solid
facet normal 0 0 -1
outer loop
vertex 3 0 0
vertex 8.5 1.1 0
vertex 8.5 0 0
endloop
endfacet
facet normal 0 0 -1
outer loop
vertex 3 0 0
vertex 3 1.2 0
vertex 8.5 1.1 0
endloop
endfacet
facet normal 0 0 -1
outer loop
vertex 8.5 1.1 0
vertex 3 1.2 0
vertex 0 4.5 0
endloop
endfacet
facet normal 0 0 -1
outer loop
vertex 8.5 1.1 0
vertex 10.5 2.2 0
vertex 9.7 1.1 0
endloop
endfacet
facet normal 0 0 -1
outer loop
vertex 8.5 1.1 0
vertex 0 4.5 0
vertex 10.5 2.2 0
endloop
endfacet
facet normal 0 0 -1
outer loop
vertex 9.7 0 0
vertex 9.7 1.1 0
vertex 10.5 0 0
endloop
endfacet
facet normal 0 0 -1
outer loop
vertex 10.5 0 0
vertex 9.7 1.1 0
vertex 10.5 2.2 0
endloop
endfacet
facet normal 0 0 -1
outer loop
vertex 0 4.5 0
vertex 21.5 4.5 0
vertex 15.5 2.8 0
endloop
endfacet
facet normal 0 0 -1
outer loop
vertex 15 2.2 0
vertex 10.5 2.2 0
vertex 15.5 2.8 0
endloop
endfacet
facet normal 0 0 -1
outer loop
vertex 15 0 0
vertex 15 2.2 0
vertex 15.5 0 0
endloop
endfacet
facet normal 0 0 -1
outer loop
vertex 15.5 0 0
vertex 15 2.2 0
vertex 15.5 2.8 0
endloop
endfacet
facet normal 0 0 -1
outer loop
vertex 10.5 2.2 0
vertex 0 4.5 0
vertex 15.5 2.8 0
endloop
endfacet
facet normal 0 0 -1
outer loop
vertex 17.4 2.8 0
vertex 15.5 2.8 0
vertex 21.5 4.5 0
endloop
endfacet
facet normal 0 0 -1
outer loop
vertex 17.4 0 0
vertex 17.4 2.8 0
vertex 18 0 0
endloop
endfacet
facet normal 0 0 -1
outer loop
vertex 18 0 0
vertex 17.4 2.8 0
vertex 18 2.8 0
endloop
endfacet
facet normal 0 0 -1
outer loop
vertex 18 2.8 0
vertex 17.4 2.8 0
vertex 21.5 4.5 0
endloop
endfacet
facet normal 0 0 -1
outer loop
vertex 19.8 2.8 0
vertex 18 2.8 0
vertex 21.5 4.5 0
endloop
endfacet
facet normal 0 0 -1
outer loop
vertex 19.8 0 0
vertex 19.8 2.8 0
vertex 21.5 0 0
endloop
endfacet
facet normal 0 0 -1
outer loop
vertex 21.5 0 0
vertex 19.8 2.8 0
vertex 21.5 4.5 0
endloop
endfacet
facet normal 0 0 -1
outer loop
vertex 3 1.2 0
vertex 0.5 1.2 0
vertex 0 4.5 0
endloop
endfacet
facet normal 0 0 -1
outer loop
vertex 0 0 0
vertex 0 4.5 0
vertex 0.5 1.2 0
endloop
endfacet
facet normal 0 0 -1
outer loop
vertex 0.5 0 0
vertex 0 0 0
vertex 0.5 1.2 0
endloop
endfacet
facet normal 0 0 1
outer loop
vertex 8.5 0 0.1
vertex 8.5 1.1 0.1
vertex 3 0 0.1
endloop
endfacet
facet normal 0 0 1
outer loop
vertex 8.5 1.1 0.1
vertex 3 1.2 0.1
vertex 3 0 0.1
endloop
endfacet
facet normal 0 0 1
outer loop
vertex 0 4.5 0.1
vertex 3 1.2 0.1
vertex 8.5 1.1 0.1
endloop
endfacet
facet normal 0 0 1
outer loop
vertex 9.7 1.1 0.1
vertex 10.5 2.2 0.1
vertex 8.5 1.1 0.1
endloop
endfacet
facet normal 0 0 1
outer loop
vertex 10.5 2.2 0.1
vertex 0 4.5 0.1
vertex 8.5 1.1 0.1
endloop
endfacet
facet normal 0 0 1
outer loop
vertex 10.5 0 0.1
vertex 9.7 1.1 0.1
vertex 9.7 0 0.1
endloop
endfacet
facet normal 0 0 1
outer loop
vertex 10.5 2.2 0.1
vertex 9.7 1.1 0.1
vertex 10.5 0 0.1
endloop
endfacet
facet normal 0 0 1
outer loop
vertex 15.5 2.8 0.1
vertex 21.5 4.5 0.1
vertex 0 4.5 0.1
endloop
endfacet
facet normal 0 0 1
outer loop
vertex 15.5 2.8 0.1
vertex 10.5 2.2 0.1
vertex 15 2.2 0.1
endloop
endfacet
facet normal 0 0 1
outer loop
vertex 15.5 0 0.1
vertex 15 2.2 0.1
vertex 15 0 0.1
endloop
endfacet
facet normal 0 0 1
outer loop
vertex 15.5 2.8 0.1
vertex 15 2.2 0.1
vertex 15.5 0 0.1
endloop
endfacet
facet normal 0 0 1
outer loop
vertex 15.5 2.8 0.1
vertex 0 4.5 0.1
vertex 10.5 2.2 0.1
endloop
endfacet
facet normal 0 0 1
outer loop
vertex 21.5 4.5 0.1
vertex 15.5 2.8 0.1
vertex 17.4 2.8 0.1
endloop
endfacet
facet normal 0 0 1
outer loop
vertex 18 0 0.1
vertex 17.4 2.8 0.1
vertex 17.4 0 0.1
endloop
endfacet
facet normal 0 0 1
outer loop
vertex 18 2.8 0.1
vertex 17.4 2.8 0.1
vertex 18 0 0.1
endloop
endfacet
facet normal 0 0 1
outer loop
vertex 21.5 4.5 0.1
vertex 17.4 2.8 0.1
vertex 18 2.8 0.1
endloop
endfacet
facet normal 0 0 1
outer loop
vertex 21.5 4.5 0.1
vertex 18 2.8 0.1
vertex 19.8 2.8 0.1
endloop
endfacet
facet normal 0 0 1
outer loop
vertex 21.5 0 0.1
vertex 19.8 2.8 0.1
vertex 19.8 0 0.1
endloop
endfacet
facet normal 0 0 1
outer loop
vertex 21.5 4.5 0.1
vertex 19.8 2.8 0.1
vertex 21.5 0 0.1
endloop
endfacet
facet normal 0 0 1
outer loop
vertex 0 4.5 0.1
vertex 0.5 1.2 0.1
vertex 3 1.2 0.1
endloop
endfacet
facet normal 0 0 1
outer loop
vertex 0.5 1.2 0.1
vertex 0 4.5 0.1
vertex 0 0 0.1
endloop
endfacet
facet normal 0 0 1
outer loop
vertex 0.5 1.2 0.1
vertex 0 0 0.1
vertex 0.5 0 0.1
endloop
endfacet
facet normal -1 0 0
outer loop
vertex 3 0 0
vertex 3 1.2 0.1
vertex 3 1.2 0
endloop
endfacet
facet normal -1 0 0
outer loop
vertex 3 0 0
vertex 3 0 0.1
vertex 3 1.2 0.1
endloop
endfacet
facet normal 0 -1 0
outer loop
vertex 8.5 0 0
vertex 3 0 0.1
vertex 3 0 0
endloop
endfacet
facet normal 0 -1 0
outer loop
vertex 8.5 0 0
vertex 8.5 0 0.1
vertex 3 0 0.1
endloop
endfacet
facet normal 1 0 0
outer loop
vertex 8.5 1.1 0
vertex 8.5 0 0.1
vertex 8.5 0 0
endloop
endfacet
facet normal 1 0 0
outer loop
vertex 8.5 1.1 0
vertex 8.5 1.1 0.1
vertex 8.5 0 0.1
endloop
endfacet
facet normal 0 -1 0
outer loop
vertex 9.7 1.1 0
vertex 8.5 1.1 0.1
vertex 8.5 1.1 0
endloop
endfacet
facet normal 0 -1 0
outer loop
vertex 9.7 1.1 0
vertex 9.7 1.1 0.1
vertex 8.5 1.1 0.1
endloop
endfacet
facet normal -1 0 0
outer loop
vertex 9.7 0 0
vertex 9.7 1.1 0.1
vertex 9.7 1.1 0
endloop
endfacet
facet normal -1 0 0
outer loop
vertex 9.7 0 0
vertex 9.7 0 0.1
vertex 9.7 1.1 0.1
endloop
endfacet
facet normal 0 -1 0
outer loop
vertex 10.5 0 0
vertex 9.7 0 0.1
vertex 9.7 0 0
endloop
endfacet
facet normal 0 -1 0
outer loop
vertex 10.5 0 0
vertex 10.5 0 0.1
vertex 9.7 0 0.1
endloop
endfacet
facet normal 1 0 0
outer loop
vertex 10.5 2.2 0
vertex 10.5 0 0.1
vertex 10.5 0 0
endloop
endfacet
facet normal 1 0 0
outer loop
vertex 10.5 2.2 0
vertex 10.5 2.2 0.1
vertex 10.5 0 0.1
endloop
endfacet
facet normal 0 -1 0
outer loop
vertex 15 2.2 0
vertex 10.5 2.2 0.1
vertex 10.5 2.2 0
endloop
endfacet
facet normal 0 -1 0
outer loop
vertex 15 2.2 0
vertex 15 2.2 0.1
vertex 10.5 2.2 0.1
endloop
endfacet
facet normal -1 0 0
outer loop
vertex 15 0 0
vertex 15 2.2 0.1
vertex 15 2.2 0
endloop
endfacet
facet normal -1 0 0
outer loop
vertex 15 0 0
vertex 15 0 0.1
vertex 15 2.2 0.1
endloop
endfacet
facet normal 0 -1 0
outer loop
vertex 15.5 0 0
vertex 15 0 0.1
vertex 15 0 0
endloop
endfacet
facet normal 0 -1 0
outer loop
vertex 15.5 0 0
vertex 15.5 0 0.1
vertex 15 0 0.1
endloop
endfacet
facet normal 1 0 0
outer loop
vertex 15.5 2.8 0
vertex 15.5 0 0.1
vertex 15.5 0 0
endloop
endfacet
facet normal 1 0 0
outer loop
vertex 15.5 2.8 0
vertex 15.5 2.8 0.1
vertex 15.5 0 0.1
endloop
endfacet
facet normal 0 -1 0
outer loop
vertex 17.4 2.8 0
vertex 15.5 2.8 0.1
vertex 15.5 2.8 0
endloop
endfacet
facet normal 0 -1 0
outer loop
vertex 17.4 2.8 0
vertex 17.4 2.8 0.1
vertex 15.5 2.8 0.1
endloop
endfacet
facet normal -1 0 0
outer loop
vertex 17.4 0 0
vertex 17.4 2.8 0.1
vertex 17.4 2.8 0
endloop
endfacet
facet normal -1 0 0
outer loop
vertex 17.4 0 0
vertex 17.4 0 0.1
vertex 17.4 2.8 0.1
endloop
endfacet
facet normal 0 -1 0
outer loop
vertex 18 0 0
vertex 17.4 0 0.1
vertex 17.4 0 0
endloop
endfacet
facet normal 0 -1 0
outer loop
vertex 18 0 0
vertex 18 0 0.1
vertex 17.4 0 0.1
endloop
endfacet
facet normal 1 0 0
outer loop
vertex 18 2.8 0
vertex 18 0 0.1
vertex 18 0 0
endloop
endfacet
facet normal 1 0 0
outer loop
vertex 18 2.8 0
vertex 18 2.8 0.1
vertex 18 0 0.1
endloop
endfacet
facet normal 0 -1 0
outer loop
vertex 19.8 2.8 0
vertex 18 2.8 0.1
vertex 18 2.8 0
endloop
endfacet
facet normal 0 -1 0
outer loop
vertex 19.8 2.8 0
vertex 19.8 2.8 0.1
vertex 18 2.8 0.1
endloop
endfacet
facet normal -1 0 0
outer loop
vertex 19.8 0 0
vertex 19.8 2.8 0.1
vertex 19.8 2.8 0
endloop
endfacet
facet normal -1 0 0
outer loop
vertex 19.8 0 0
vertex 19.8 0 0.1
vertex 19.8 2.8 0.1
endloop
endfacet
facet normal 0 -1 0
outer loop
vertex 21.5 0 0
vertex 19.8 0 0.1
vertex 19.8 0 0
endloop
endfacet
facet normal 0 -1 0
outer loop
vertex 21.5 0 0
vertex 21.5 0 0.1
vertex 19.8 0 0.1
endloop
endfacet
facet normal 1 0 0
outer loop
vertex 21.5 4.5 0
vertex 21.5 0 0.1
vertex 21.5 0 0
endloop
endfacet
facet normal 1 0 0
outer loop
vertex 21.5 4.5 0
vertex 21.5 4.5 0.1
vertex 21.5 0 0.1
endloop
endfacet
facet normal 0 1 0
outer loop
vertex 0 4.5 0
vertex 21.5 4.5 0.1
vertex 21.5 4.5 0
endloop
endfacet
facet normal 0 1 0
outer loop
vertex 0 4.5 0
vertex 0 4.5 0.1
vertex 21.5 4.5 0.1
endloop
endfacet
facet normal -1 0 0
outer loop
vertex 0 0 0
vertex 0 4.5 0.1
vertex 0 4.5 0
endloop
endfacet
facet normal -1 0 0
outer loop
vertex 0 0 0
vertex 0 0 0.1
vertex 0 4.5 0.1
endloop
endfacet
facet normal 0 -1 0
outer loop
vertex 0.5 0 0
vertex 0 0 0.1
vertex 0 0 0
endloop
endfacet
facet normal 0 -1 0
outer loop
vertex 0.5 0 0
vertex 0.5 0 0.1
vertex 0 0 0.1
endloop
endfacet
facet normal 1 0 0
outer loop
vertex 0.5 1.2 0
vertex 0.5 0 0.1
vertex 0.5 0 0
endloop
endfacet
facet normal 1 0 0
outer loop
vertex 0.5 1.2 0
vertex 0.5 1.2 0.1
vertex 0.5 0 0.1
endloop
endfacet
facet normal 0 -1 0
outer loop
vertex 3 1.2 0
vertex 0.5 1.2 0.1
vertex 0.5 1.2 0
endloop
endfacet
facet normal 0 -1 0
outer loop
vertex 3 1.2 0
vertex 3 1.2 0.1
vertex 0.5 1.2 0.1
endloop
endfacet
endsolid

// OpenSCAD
lh = 0.1;

difference()
linear_extrude(height = lh) {
    difference() {
        translate([0,0]) square([21.5, 4.5]);
        translate([0.5,0]) square([2.5, 1.2]);

        translate([8.5,0]) square([1.2, 1.1]);
        translate([10.5,0]) square([4.5, 2.2]);
        translate([15.5,0]) square([1.9, 2.8]);
        translate([18.0,0]) square([1.8, 2.8]);
    }
}
